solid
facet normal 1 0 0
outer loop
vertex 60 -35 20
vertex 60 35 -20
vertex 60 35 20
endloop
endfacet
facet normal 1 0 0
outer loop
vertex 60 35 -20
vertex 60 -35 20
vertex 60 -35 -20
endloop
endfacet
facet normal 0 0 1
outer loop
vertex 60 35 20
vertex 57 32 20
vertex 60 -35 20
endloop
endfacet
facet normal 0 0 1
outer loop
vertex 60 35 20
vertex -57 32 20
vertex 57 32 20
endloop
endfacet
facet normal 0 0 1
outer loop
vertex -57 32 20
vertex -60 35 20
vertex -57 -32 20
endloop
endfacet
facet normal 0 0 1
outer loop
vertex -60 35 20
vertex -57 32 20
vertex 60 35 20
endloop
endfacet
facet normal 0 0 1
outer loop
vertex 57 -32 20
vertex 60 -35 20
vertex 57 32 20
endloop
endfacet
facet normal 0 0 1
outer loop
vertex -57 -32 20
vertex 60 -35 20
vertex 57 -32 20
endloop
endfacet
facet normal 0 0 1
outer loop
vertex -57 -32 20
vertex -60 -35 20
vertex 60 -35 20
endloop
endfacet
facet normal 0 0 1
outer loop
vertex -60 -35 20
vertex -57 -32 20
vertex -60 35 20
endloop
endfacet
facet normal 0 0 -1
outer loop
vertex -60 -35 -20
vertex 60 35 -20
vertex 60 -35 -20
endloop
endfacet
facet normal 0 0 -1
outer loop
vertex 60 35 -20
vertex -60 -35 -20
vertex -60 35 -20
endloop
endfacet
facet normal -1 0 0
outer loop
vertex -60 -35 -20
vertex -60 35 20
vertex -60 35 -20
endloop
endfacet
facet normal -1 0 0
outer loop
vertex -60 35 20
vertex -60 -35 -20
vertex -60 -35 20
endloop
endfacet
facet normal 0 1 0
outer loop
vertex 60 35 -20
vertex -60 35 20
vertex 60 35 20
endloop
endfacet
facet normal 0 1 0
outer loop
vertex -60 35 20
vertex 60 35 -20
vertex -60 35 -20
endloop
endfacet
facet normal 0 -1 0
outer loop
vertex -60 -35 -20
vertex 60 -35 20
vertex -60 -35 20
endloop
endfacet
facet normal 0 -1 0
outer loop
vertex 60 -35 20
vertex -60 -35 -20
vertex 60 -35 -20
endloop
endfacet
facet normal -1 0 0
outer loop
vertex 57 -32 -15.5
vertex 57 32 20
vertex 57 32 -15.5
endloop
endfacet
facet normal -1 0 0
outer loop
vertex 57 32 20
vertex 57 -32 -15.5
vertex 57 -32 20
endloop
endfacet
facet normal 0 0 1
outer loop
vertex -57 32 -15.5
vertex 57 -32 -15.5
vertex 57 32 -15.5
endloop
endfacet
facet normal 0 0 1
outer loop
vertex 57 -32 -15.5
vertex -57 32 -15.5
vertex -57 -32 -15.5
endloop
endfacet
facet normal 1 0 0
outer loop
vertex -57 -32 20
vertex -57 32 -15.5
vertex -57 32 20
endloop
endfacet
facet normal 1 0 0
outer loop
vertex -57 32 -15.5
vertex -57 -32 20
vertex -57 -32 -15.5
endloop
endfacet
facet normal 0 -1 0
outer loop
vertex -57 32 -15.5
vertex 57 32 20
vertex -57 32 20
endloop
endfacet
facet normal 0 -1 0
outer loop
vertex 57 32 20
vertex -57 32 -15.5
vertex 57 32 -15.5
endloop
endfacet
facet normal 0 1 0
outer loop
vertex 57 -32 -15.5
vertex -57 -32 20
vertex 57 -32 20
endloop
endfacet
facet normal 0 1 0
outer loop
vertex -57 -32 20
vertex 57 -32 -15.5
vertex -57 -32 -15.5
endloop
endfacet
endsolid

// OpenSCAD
// Buffer tank for mini horizontal gel-electrophoresis box
// Dimensions in mm

// Outer dimensions
outer_x = 120;
outer_y = 70;
outer_z = 40;

// Wall and floor thickness
wall_thickness = 3;
floor_thickness = 3;

// Platform dimensions
platform_length = 60;
platform_height_above_inner_floor = 10;
// Platform spans full inner width (Y)

// Electrode hole
hole_diameter = 2;
hole_z = 30;
hole_y = 0;

// Derived dimensions
inner_x = outer_x - 2 * wall_thickness;
inner_y = outer_y - 2 * wall_thickness;

// Platform top Z position relative to global origin
// Floor is at z=0, floor thickness is 3. Inner floor is at z=3.
// Platform top is 10mm above inner floor.
platform_top_z = floor_thickness + platform_height_above_inner_floor; // 13 mm

// Platform half-length in X
platform_half_x = platform_length / 2;

// Hole radius
hole_radius = hole_diameter / 2;

// Extrusion depth for cutting holes (must extend past faces)
cut_depth = 1.0;

// Build the part
// The part rests on the XY plane at z = 0.
// It is centred on the origin in X and Y.

difference() {
    // Main tank body (outer shell)
    // Centered on X, Y. Resting on Z=0.
    // X: -60 to 60. Y: -35 to 35. Z: 0 to 40.
    translate([0, 0, 0]) {
        cube([outer_x, outer_y, outer_z], center = true);
    }

    // Subtract inner cavity
    // Inner cavity starts at z = floor_thickness (3mm)
    // Inner dimensions:
    // X: -inner_x/2 to inner_x/2
    // Y: -inner_y/2 to inner_y/2
    // Z: floor_thickness to outer_z (open top)
    
    translate([0, 0, floor_thickness]) {
        cube([inner_x, inner_y, outer_z - floor_thickness], center = true);
    }

    // Subtract the platform
    // Platform sits on inner floor (z = floor_thickness)
    // Platform top is at z = platform_top_z (13mm)
    // Platform length is 60mm in X, centered.
    // Platform spans full inner width in Y.
    
    translate([0, 0, floor_thickness]) {
        cube([platform_length, inner_y, platform_top_z - floor_thickness], center = true);
    }

    // Drill electrode holes
    // Hole is at y = 0, z = hole_z (30mm)
    // Hole goes through the end walls.
    // The walls are at X = -outer_x/2 and X = outer_x/2.
    // We need to cut a cylinder through the solid at these locations.
    // The hole axis is along X.
    
    // Left Hole
    translate([-outer_x / 2, hole_y, hole_z]) {
        $fn = 64;
        rotate([90, 0, 0]) {
            cylinder(
                d = hole_diameter + 0.02, // Slightly larger to ensure cut
                h = outer_x + cut_depth, // Long enough to cut through
                center = true
            );
        }
    }

    // Right Hole
    translate([outer_x / 2, hole_y, hole_z]) {
        $fn = 64;
        rotate([90, 0, 0]) {
            cylinder(
                d = hole_diameter + 0.02,
                h = outer_x + cut_depth,
                center = true
            );
        }
    }
}
